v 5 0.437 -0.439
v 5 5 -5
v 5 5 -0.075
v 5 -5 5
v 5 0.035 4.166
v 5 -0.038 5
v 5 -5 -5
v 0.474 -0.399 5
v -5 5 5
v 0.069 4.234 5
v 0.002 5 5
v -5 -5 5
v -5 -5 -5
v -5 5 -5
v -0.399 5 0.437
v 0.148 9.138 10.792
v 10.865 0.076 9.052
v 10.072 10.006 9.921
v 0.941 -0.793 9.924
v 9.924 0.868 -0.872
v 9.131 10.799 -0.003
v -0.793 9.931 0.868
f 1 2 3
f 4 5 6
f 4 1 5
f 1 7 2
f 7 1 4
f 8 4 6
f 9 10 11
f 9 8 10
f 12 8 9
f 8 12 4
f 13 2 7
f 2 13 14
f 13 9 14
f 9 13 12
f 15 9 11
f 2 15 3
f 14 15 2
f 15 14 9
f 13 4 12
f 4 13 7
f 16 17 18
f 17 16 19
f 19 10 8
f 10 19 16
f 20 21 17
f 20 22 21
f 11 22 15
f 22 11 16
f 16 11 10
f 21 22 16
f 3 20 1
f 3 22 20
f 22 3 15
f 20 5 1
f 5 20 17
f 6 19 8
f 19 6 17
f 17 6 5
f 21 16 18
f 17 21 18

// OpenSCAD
color([1,0,0]) rotate([0,0,0]) translate([0,0,0]) cube(10,true);
color([0,0,1,0.5]) rotate([5,5,5]) translate([5,5,5]) cube(10,true);

translate([20,-5,-8]) rotate([90,0,90]) text("<-------->", 2);
translate([20,-3.5,-10]) rotate([90,0,90]) text("10 cm", 2);
